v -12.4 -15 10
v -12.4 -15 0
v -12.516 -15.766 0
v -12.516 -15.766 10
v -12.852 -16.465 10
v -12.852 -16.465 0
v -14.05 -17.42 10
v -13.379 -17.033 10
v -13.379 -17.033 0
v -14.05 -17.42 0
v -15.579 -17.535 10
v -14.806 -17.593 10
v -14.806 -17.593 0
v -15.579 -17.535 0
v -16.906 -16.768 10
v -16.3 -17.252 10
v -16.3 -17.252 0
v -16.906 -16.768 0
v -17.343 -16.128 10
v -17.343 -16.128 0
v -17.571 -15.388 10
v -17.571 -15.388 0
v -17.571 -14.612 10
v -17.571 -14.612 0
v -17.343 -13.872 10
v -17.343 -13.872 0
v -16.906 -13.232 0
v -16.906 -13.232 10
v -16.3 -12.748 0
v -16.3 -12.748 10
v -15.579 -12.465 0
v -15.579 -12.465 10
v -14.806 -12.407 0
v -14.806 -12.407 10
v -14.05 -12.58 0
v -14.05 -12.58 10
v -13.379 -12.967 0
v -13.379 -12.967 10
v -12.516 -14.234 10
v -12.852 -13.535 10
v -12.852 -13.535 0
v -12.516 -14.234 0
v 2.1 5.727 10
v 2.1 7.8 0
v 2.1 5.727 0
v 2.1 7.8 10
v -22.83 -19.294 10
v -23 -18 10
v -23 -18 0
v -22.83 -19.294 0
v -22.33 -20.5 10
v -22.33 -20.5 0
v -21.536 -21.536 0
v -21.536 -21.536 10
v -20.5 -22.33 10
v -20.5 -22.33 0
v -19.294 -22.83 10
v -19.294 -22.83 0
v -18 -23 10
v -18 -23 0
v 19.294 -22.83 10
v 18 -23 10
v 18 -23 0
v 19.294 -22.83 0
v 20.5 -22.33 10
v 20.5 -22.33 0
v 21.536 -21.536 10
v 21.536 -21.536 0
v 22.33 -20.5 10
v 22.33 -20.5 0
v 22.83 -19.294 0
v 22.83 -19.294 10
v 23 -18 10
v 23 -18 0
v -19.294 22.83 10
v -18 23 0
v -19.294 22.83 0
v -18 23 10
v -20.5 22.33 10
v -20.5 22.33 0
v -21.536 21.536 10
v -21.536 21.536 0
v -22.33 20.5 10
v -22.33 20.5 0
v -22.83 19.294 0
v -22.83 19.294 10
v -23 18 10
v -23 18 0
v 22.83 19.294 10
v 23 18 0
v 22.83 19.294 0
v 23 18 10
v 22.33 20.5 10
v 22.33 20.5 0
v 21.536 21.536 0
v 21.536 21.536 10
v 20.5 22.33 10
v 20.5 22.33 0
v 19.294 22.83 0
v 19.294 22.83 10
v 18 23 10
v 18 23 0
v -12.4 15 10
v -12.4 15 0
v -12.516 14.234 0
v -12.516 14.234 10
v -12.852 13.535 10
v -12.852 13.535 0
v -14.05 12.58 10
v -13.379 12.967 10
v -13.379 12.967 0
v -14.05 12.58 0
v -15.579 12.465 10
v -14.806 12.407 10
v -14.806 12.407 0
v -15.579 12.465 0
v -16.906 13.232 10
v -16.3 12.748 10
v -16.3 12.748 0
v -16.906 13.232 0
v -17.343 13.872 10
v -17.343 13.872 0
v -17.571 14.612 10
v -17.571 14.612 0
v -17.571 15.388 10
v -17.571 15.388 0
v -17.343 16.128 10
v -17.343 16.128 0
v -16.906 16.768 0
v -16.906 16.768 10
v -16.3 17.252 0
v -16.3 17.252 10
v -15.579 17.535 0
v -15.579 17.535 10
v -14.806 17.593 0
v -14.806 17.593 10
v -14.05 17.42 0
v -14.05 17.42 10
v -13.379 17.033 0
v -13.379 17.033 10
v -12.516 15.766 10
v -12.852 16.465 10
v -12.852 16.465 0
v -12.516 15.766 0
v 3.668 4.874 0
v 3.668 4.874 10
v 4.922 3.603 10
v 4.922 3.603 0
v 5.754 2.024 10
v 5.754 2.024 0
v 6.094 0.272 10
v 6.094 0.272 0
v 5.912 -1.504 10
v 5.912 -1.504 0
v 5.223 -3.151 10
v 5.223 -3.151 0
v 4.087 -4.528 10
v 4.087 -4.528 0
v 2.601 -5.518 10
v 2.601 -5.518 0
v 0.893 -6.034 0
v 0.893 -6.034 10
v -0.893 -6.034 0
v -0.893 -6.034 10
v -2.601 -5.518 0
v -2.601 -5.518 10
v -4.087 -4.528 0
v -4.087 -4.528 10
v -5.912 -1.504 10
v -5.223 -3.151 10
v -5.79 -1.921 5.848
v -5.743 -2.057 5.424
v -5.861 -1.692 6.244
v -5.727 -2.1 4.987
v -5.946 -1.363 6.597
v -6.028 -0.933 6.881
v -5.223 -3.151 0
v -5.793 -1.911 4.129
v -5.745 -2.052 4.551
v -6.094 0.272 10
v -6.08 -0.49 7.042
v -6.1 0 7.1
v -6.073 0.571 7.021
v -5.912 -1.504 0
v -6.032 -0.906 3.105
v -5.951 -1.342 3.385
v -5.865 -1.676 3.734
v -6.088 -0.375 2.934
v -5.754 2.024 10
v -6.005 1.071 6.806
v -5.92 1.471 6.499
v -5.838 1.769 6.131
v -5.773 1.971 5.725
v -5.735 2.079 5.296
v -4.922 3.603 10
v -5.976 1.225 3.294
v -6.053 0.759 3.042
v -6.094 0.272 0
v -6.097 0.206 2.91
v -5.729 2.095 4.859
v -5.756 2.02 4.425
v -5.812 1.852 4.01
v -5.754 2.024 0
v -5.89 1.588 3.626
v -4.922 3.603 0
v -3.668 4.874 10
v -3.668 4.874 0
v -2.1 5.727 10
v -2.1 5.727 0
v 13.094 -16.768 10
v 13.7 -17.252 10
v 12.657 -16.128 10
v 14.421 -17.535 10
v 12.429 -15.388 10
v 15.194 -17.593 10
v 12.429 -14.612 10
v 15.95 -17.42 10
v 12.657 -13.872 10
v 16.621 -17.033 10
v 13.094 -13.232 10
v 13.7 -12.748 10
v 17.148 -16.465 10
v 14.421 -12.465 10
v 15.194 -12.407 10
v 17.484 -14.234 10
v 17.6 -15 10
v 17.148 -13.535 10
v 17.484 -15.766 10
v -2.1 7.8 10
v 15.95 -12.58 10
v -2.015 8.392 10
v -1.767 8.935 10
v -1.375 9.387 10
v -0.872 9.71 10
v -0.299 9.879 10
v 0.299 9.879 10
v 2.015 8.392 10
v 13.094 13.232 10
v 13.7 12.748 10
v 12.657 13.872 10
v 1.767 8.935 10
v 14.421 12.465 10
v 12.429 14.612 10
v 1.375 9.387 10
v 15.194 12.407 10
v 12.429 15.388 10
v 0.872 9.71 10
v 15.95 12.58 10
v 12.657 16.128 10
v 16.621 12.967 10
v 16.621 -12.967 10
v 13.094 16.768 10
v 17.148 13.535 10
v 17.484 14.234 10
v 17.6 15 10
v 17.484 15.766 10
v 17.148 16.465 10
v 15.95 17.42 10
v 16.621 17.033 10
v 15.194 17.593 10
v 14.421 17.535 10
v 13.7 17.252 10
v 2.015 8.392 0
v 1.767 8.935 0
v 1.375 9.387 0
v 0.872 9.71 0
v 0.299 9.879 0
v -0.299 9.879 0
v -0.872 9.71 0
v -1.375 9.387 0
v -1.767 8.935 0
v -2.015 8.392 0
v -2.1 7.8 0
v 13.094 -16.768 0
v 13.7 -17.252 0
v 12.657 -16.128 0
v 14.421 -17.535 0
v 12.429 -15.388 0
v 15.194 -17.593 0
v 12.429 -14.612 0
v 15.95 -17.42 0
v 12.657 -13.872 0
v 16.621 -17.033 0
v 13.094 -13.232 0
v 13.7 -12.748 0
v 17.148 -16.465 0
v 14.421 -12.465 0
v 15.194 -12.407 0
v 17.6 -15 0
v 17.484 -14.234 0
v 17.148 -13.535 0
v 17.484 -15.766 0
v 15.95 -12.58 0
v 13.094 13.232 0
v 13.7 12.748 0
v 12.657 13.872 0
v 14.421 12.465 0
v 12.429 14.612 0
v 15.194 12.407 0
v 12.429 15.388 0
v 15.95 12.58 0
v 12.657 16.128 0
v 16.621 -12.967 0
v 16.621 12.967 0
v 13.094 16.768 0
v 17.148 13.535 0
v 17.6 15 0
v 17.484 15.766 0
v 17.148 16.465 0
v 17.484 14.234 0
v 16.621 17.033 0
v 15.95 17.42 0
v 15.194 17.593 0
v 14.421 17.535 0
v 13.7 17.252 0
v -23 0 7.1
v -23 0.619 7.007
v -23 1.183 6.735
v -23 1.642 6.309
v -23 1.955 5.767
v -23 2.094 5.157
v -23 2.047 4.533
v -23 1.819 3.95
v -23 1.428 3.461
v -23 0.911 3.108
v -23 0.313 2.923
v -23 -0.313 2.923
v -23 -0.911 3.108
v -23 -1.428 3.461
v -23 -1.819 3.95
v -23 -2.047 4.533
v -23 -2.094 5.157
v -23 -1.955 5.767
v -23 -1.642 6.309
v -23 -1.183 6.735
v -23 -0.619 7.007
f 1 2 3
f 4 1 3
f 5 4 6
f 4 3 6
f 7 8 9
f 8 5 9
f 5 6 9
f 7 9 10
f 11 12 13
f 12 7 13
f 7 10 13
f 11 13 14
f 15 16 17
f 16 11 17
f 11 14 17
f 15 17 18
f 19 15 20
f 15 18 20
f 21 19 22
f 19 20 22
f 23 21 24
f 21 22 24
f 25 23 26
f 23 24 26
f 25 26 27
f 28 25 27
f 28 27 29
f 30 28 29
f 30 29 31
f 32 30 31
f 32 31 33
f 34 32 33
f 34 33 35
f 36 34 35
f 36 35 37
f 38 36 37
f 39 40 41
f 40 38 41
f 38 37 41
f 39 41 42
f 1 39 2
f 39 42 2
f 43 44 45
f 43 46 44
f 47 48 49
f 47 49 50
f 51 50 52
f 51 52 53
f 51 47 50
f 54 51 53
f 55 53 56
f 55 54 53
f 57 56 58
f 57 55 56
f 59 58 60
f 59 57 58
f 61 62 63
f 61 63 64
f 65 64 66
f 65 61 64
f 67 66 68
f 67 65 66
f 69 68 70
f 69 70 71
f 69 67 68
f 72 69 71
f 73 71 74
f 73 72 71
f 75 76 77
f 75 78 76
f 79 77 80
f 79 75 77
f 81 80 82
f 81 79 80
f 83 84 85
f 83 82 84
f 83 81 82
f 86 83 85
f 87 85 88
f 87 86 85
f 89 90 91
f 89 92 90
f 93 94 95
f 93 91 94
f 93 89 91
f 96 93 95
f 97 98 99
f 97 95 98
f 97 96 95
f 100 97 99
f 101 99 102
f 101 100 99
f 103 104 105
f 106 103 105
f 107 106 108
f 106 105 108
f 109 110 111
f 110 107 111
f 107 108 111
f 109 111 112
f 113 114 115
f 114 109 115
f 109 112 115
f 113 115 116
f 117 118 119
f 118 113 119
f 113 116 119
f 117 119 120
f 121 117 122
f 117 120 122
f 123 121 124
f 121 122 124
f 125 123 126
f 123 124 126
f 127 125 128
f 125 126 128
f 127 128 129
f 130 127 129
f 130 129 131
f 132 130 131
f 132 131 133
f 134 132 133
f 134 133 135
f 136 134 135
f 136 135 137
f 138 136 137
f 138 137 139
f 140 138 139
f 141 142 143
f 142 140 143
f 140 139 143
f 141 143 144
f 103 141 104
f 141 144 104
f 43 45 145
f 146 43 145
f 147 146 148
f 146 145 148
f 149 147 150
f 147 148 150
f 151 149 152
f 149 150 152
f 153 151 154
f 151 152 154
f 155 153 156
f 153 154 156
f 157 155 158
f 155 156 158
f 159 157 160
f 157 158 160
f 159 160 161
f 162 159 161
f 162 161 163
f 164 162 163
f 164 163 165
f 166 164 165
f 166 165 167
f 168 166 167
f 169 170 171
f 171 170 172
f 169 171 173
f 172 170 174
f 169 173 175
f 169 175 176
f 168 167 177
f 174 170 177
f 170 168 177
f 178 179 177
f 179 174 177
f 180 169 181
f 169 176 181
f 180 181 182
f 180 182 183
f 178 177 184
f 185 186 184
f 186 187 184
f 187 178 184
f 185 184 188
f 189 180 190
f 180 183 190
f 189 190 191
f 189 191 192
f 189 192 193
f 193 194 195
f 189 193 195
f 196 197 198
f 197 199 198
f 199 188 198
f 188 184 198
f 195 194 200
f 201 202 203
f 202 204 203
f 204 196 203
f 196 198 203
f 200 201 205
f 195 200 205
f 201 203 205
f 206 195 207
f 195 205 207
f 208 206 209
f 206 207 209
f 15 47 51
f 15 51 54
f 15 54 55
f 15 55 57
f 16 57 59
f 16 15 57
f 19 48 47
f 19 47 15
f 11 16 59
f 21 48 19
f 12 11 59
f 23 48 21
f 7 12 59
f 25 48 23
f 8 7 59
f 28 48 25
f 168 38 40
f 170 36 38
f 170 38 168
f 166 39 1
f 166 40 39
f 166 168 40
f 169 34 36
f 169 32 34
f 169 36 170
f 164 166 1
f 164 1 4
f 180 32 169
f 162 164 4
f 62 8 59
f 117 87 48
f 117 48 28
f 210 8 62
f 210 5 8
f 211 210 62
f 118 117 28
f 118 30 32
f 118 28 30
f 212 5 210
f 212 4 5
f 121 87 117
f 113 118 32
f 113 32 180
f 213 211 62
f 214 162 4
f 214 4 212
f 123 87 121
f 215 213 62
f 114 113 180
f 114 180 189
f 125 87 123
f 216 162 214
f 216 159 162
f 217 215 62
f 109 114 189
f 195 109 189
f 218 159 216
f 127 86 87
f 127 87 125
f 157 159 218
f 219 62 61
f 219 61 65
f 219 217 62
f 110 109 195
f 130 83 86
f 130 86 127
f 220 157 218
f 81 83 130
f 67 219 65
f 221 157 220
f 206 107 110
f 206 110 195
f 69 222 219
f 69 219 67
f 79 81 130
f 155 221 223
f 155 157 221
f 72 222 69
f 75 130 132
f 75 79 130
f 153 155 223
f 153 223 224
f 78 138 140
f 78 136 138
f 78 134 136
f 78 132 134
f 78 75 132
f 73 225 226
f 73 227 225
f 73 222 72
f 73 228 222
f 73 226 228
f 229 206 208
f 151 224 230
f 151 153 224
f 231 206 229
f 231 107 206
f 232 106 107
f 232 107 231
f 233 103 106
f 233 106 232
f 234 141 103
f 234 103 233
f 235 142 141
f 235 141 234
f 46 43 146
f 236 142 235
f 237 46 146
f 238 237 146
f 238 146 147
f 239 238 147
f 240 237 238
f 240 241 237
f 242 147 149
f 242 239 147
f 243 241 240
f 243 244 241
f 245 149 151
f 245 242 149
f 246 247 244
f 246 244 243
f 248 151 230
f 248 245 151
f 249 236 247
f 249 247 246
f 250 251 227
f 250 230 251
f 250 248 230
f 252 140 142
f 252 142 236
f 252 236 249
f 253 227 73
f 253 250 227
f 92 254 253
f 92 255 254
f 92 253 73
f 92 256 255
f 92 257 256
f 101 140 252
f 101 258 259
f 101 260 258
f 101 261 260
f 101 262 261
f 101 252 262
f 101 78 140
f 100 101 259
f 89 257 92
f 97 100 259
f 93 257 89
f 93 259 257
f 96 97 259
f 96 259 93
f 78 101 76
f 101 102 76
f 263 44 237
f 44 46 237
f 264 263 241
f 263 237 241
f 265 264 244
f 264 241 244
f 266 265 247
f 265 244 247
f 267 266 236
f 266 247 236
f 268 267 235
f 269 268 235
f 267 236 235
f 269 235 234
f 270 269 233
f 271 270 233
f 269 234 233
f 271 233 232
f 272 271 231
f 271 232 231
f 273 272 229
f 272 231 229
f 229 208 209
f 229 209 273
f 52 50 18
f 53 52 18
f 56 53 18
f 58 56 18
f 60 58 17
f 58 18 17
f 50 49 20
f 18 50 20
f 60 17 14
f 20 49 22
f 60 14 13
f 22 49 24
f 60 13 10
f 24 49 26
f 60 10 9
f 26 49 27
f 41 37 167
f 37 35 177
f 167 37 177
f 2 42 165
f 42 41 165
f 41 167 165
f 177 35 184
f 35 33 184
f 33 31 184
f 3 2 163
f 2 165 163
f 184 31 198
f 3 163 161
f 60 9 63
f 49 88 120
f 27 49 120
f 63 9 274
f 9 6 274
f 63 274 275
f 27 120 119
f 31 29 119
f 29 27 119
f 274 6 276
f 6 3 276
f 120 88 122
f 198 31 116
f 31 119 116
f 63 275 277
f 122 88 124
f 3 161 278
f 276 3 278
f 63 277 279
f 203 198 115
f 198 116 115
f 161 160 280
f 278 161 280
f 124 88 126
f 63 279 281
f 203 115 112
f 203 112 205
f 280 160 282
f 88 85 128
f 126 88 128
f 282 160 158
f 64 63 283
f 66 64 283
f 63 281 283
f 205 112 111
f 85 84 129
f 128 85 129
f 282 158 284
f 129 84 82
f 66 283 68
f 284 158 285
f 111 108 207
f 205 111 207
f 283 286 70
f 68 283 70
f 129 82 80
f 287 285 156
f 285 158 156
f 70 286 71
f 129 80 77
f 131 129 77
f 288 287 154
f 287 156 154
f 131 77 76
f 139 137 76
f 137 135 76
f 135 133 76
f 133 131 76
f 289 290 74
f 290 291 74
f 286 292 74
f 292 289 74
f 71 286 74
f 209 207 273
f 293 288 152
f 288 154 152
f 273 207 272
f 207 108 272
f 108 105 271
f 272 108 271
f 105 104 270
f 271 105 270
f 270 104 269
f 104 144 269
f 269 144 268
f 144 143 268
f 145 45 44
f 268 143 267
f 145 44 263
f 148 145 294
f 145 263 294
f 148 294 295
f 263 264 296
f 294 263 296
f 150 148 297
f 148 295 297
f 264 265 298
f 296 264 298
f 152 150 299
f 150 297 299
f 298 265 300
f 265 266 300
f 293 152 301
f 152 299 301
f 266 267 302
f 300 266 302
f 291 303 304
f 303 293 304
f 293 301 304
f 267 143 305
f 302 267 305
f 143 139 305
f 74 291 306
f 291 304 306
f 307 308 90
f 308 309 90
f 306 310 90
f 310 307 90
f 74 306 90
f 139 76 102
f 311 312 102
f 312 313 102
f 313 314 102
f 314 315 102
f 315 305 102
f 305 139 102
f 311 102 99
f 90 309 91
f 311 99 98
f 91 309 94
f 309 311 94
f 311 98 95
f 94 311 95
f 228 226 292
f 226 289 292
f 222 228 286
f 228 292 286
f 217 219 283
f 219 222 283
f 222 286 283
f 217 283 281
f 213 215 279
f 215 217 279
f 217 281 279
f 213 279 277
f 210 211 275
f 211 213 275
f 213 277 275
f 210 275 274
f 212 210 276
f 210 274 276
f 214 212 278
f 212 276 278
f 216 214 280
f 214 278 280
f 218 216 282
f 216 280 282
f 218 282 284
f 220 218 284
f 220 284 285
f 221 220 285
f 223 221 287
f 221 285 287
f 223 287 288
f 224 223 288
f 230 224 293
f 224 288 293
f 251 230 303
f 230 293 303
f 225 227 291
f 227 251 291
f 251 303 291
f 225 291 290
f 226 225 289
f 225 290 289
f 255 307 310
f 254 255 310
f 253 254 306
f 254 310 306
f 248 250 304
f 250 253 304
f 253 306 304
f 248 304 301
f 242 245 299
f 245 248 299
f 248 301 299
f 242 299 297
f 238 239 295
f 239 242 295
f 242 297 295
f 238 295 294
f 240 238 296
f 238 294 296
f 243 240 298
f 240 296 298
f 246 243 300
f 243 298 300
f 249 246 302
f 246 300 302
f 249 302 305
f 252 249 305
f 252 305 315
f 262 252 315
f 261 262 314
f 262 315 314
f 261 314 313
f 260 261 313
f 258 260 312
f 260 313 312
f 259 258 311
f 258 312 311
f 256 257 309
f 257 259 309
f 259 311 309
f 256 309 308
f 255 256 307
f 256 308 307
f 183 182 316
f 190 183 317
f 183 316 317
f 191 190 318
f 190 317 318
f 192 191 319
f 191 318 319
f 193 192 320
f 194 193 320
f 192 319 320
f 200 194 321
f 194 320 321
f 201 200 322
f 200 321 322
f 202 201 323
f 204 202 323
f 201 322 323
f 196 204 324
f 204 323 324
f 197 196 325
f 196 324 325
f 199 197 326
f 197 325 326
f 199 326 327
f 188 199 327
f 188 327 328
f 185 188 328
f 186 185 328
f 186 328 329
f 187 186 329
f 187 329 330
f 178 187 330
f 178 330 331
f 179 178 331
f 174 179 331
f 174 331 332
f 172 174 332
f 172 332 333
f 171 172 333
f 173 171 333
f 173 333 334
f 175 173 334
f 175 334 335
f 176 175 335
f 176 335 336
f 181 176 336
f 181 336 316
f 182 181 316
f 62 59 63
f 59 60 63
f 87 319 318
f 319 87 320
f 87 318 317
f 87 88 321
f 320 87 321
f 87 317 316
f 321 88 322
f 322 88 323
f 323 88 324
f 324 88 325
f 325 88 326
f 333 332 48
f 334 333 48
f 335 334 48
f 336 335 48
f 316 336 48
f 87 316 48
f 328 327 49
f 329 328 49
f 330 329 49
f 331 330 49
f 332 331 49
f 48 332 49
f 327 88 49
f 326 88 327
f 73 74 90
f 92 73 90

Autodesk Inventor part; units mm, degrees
ref_plane "YZ Plane" through (0, 0, 0) normal (1, 0, 0) x (0, 1, 0)
ref_plane "XZ Plane" through (0, 0, 0) normal (0, 1, 0) x (-1, 0, 0)
ref_plane "XY Plane" through (0, 0, 0) normal (0, 0, 1) x (1, 0, 0)
sketch "スケッチ1" plane through (0, 0, 0) normal (0, 0, 1) x (1, 0, 0)
  circle A0 centre (0, 0) radius 6.1
  circle A1 centre (0, 0) radius 21.2132 construction
  line L0 (0, 0) -> (15, 15) construction
  line L1 (0, 0) -> (0, 37.5908) construction
  circle A2 centre (15, 15) radius 2.6
  circle A3 centre (-15, 15) radius 2.6
  circle A4 centre (-15, -15) radius 2.6
  circle A5 centre (15, -15) radius 2.6
  line L2 (-15, 15) -> (15, 15) construction
  line L3 (15, 15) -> (15, -15) construction
  line L4 (15, -15) -> (-15, -15) construction
  line L5 (-15, -15) -> (-15, 15) construction
  line L6 (-23, -23) -> (23, -23)
  line L7 (23, -23) -> (23, 23)
  line L8 (23, 23) -> (-23, 23)
  line L9 (-23, 23) -> (-23, -23)
  line L10 (-23, -23) -> (23, 23) construction
  line L11 (23, -23) -> (-23, 23) construction
  circle A6 centre (0, 0) radius 15 construction
  circle A7 centre (-15, 15) radius 5.7791 construction
  dimension "d1" = 12.2
  dimension "d3" = 45
  dimension "d4" = 5.2
  dimension "d7" = 360
  dimension "d11" = 30
  dimension "d12" = 46
extrude "押し出し1" add sketch "スケッチ1" along normal blind 10
sketch "スケッチ2" plane through (-23, -23, 0) normal (-1, 0, 0) x (0, 0, 1)
  line L0 (0, 23) -> (10, 23) construction
  line L1 (10, 29.1) -> (10, 16.9) construction
  circle A0 centre (5, 23) radius 2.1
  dimension "d14" = 4.2
extrude "押し出し2" cut sketch "スケッチ2" against normal up to next
fillet "フィレット2" radius 5 4 edges at (23, -23, 5) (23, 23, 5) (-23, -23, 5) (-23, 23, 5)
sketch "スケッチ3" plane through (0, 0, 10) normal (0, 0, 1) x (1, 0, 0)
  circle A0 centre (0, 0) radius 6.1 projected
  line L0 (-2.1, 5.7271) -> (-2.1, 7.8)
  line L1 (-2.1, 7.8) -> (2.1, 7.8) construction
  line L2 (2.1, 7.8) -> (2.1, 5.7271)
  line L3 (0, 0) -> (0, 23) construction
  line L4 (18, 23) -> (-18, 23) construction
  arc A1 (2.1, 7.8) -> (-2.1, 7.8) centre (0, 7.8) ccw
  line L5 (-2.1, 5.7271) -> (2.1, 5.7271)
  point P0 (0, 6.1)
  dimension "d18" = 2.1
  dimension "d23" = 7.8
extrude "押し出し3" cut sketch "スケッチ3" against normal blind 10 contours A0 L0 A1 L2
properties part number "車輪ハブ3"
